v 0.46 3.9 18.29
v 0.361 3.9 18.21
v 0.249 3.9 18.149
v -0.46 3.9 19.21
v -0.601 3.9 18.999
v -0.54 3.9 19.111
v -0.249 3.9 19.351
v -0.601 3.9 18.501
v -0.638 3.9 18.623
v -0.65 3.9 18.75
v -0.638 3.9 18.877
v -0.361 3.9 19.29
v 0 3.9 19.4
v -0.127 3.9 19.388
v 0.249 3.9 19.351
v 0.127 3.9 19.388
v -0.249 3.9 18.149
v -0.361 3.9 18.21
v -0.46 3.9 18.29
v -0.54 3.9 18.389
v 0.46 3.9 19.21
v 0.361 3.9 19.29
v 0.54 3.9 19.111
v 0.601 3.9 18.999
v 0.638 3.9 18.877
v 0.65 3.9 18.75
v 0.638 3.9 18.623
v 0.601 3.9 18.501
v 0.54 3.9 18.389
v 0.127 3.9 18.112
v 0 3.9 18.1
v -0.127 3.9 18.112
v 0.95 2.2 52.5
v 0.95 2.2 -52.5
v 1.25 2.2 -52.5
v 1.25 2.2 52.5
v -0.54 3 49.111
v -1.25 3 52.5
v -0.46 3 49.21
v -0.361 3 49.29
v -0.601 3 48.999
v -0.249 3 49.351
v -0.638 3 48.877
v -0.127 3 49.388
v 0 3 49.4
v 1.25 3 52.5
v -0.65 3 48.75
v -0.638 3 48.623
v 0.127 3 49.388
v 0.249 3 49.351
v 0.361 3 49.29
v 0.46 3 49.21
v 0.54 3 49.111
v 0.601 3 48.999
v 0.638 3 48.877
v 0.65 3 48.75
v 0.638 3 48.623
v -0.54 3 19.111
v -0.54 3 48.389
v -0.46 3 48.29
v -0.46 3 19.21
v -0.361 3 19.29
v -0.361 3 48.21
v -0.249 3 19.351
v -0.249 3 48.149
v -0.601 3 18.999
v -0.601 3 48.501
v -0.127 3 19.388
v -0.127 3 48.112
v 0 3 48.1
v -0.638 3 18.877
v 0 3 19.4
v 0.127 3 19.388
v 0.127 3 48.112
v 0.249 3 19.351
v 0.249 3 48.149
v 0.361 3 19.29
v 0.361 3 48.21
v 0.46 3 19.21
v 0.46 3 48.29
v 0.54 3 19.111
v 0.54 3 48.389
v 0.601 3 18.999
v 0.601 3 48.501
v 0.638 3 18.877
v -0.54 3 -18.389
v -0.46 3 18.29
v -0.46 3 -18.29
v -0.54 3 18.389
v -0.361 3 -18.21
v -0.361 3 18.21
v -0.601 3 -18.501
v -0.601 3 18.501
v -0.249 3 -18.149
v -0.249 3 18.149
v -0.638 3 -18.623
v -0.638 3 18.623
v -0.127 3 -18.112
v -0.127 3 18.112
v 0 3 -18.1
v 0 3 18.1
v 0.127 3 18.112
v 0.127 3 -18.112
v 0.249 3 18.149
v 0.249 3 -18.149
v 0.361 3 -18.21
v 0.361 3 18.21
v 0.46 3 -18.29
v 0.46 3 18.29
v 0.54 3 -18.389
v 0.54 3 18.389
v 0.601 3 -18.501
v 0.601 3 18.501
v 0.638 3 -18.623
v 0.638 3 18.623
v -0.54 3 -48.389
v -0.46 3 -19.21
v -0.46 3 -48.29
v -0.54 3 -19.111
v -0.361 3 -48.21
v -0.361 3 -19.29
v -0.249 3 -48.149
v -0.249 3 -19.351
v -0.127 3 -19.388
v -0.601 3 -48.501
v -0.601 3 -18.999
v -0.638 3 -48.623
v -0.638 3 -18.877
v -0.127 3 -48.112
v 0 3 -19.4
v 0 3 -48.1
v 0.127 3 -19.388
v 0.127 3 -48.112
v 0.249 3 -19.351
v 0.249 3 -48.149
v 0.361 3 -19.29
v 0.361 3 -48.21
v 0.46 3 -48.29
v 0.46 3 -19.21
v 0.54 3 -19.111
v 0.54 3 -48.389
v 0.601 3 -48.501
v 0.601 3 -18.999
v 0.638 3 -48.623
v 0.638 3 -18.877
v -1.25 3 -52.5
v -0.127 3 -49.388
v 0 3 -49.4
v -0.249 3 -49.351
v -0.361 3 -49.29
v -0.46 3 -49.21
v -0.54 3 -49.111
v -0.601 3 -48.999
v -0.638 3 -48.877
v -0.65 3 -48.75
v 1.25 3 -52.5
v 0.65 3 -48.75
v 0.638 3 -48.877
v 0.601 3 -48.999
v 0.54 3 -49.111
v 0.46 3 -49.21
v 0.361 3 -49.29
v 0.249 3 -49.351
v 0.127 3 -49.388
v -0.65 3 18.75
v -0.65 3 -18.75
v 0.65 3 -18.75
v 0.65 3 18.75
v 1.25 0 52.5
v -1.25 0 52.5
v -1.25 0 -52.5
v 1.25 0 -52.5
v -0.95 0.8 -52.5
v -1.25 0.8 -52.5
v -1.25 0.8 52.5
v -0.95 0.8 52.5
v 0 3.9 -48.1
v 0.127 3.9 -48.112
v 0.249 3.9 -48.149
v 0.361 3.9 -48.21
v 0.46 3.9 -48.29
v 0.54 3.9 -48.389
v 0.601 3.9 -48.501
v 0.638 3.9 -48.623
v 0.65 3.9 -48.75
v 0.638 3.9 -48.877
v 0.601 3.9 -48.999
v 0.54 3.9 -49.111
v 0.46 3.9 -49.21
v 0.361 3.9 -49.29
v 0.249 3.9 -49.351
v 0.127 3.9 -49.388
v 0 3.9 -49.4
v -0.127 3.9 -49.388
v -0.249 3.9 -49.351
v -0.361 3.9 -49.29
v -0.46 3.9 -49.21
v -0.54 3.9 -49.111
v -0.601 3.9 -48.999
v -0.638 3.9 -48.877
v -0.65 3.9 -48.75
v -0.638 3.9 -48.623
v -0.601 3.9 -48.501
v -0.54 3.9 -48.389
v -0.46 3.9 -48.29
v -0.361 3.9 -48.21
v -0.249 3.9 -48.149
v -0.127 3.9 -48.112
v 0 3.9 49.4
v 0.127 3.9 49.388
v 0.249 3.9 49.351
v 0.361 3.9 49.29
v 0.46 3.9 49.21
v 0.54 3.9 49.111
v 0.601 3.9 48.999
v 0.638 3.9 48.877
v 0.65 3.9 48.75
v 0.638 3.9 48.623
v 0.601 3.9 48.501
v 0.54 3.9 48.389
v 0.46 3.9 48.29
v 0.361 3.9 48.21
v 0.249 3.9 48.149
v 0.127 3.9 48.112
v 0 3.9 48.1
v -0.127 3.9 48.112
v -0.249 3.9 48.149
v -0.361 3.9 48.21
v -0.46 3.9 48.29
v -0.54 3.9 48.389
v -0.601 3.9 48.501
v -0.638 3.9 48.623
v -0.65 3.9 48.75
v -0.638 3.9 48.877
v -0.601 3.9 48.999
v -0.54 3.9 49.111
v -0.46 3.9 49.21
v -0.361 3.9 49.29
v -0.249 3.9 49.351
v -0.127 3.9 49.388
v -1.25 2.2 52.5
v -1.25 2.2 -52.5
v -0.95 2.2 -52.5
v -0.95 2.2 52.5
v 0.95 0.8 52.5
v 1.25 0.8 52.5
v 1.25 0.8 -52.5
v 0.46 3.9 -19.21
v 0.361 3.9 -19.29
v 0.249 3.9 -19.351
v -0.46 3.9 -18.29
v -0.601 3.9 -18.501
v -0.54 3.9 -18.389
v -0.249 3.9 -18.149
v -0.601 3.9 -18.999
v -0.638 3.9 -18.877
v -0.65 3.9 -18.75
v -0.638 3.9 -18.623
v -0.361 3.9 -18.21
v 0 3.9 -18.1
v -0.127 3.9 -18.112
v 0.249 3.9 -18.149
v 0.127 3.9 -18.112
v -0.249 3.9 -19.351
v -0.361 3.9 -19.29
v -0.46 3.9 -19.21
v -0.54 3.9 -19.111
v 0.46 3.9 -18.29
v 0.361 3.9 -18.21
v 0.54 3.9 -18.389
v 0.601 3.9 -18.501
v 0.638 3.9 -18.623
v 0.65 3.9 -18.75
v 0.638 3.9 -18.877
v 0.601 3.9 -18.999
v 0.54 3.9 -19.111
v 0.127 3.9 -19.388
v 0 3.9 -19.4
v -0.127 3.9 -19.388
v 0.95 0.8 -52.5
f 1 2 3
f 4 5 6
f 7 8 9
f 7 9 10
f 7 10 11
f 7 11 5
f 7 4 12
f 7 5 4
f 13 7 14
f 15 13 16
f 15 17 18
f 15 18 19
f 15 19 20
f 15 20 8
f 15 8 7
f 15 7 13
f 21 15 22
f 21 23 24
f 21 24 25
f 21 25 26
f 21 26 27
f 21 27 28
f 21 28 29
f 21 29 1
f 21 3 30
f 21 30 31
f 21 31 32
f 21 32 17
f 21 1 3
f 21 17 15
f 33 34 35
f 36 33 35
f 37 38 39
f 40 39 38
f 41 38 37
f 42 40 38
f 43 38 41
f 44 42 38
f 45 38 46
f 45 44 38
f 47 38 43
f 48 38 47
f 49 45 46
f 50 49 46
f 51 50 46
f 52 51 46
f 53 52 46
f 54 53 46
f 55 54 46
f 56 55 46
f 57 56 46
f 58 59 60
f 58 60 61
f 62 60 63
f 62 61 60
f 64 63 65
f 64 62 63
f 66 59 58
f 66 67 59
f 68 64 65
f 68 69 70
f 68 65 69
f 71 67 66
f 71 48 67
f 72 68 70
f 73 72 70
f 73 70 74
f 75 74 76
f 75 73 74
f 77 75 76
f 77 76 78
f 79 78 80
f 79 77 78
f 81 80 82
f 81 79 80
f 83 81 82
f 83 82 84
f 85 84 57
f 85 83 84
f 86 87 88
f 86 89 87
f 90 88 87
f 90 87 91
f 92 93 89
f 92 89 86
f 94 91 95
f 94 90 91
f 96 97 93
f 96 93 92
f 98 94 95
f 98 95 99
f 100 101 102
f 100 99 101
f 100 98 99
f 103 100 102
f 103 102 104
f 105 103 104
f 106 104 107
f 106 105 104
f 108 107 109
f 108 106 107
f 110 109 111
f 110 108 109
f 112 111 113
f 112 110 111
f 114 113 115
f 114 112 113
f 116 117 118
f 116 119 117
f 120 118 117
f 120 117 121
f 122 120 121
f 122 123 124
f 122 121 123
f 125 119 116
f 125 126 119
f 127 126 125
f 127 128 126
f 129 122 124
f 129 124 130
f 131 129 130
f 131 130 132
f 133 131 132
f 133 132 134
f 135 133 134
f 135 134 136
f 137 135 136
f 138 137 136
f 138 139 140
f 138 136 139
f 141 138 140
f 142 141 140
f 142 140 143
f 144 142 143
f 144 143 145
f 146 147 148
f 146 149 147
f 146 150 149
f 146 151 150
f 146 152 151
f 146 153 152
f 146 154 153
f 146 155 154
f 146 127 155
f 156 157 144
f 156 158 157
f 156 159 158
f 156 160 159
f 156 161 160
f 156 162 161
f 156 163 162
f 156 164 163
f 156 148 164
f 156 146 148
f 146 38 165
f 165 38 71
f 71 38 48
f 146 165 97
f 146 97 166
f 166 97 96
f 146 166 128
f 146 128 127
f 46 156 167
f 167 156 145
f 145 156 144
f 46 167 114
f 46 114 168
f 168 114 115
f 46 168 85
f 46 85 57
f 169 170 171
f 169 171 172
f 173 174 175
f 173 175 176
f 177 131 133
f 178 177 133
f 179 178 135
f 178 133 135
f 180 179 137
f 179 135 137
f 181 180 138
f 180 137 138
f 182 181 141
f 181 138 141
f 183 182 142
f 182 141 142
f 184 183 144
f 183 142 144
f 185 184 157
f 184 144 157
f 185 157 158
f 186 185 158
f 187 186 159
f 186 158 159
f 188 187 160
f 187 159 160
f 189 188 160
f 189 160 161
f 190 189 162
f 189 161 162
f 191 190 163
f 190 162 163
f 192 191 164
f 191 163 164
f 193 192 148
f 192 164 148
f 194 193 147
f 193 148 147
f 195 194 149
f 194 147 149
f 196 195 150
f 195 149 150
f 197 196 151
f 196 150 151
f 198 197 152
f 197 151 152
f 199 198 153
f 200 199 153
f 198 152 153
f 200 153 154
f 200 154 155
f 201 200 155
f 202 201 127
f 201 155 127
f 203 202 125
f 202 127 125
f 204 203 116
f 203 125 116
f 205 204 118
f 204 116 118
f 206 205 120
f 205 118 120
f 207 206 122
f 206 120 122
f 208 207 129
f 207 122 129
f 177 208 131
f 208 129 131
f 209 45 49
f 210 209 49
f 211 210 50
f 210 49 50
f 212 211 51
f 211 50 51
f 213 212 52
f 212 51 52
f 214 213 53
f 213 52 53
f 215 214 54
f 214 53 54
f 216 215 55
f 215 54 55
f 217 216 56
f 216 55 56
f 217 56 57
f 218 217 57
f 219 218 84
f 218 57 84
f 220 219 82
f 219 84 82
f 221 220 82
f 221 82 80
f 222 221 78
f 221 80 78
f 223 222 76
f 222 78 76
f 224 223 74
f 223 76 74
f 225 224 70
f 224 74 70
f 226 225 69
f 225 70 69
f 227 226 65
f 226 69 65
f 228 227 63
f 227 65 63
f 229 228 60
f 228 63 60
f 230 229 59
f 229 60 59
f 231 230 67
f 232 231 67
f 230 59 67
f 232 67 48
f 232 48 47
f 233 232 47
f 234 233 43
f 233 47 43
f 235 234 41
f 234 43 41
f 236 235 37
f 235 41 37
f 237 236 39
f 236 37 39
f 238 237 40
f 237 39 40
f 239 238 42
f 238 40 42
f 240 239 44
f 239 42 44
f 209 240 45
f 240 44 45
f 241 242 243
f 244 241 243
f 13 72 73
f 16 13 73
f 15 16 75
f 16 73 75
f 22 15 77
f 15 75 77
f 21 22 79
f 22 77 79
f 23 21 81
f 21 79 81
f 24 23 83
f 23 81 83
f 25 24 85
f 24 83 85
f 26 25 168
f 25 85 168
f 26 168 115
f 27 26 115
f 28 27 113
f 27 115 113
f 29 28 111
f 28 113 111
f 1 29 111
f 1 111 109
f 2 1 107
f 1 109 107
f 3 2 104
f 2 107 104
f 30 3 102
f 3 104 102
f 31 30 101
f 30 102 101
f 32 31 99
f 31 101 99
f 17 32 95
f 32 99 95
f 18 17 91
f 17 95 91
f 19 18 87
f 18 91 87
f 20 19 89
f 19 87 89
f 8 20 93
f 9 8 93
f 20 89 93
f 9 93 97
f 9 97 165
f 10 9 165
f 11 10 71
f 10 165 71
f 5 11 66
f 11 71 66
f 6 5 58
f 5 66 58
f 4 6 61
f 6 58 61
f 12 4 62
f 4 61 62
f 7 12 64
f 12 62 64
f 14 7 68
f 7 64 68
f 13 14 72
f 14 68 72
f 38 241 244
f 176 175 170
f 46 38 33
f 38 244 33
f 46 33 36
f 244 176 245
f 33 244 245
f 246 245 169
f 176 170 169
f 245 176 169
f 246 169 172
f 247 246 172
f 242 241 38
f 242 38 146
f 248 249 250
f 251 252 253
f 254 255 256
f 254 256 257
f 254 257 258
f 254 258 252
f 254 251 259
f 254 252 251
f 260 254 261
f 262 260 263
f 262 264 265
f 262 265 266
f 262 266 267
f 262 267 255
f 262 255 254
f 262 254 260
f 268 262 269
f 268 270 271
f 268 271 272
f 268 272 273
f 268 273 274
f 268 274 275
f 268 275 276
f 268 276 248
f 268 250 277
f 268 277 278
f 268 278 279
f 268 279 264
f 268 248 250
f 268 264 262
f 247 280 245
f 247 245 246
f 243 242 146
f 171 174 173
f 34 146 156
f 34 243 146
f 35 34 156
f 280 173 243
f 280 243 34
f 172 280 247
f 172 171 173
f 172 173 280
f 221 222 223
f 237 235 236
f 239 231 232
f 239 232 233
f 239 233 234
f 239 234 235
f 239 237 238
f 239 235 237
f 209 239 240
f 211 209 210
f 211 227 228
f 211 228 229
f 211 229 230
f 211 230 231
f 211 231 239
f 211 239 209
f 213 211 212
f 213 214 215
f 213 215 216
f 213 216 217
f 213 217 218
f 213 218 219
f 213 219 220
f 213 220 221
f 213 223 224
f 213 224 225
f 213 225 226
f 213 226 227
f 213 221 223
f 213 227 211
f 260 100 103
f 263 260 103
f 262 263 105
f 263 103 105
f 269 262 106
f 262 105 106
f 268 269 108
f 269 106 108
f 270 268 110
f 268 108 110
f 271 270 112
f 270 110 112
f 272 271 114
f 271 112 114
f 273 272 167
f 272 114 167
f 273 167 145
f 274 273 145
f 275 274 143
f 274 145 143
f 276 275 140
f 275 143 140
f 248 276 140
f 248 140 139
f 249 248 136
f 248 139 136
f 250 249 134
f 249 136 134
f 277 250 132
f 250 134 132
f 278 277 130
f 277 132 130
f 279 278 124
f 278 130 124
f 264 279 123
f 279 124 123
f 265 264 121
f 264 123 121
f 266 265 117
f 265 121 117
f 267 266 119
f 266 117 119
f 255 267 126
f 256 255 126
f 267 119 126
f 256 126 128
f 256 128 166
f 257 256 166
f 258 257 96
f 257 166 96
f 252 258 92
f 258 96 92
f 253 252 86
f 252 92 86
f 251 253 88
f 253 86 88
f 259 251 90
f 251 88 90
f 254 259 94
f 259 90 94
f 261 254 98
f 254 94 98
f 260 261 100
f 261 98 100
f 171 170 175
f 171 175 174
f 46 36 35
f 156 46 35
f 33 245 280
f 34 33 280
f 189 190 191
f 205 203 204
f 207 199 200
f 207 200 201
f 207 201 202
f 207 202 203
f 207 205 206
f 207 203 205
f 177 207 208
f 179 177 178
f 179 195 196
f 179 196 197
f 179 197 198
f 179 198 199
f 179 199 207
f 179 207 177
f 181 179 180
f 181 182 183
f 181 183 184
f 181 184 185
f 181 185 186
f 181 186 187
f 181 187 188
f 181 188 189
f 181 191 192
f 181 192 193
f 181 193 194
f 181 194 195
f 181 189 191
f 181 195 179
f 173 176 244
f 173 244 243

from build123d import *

# Parameters (mm, degrees)
SKETCH1_W           = 2.5
SKETCH1_H           = 105
BOSS_EXTRUDE1_DEPTH = 0.8
SKETCH2_W           = 1.9
SKETCH2_H           = 105
BOSS_EXTRUDE2_DEPTH = 1.4
SKETCH3_W           = 2.5
SKETCH3_H           = 105
BOSS_EXTRUDE3_DEPTH = 0.8
SKETCH4_R           = 0.65
BOSS_EXTRUDE4_DEPTH = 0.9


with BuildPart() as part:
    # Sketch1 → Boss-Extrude1 (new body)
    with BuildSketch(Plane(origin=(0, 0, 0), x_dir=(1, 0, 0), z_dir=(0, 1, 0))):
        Rectangle(SKETCH1_W, SKETCH1_H)
    extrude(amount=BOSS_EXTRUDE1_DEPTH)

    # Sketch2 → Boss-Extrude2 (add)
    with BuildSketch(Plane(origin=(0, 0.8, 0), x_dir=(1, 0, 0), z_dir=(0, 1, 0))):
        Rectangle(SKETCH2_W, SKETCH2_H)
    extrude(amount=BOSS_EXTRUDE2_DEPTH)

    # Sketch3 → Boss-Extrude3 (add)
    with BuildSketch(Plane(origin=(0, 2.2, 0), x_dir=(1, 0, 0), z_dir=(0, 1, 0))):
        Rectangle(SKETCH3_W, SKETCH3_H)
    extrude(amount=BOSS_EXTRUDE3_DEPTH)

    # Sketch4 → Boss-Extrude4 (add)
    with BuildSketch(Plane(origin=(0, 3, 0), x_dir=(1, 0, 0), z_dir=(0, 1, 0))):
        with Locations(Location((0, 18.75, 0), (0, 0, 270))):
            Circle(SKETCH4_R)
        with Locations(Location((0, -18.75, 0), (0, 0, 270))):
            Circle(SKETCH4_R)
        with Locations(Location((0, 48.75, 0), (0, 0, 270))):
            Circle(SKETCH4_R)
        with Locations(Location((0, -48.75, 0), (0, 0, 270))):
            Circle(SKETCH4_R)
    extrude(amount=BOSS_EXTRUDE4_DEPTH)


solid = part.part
